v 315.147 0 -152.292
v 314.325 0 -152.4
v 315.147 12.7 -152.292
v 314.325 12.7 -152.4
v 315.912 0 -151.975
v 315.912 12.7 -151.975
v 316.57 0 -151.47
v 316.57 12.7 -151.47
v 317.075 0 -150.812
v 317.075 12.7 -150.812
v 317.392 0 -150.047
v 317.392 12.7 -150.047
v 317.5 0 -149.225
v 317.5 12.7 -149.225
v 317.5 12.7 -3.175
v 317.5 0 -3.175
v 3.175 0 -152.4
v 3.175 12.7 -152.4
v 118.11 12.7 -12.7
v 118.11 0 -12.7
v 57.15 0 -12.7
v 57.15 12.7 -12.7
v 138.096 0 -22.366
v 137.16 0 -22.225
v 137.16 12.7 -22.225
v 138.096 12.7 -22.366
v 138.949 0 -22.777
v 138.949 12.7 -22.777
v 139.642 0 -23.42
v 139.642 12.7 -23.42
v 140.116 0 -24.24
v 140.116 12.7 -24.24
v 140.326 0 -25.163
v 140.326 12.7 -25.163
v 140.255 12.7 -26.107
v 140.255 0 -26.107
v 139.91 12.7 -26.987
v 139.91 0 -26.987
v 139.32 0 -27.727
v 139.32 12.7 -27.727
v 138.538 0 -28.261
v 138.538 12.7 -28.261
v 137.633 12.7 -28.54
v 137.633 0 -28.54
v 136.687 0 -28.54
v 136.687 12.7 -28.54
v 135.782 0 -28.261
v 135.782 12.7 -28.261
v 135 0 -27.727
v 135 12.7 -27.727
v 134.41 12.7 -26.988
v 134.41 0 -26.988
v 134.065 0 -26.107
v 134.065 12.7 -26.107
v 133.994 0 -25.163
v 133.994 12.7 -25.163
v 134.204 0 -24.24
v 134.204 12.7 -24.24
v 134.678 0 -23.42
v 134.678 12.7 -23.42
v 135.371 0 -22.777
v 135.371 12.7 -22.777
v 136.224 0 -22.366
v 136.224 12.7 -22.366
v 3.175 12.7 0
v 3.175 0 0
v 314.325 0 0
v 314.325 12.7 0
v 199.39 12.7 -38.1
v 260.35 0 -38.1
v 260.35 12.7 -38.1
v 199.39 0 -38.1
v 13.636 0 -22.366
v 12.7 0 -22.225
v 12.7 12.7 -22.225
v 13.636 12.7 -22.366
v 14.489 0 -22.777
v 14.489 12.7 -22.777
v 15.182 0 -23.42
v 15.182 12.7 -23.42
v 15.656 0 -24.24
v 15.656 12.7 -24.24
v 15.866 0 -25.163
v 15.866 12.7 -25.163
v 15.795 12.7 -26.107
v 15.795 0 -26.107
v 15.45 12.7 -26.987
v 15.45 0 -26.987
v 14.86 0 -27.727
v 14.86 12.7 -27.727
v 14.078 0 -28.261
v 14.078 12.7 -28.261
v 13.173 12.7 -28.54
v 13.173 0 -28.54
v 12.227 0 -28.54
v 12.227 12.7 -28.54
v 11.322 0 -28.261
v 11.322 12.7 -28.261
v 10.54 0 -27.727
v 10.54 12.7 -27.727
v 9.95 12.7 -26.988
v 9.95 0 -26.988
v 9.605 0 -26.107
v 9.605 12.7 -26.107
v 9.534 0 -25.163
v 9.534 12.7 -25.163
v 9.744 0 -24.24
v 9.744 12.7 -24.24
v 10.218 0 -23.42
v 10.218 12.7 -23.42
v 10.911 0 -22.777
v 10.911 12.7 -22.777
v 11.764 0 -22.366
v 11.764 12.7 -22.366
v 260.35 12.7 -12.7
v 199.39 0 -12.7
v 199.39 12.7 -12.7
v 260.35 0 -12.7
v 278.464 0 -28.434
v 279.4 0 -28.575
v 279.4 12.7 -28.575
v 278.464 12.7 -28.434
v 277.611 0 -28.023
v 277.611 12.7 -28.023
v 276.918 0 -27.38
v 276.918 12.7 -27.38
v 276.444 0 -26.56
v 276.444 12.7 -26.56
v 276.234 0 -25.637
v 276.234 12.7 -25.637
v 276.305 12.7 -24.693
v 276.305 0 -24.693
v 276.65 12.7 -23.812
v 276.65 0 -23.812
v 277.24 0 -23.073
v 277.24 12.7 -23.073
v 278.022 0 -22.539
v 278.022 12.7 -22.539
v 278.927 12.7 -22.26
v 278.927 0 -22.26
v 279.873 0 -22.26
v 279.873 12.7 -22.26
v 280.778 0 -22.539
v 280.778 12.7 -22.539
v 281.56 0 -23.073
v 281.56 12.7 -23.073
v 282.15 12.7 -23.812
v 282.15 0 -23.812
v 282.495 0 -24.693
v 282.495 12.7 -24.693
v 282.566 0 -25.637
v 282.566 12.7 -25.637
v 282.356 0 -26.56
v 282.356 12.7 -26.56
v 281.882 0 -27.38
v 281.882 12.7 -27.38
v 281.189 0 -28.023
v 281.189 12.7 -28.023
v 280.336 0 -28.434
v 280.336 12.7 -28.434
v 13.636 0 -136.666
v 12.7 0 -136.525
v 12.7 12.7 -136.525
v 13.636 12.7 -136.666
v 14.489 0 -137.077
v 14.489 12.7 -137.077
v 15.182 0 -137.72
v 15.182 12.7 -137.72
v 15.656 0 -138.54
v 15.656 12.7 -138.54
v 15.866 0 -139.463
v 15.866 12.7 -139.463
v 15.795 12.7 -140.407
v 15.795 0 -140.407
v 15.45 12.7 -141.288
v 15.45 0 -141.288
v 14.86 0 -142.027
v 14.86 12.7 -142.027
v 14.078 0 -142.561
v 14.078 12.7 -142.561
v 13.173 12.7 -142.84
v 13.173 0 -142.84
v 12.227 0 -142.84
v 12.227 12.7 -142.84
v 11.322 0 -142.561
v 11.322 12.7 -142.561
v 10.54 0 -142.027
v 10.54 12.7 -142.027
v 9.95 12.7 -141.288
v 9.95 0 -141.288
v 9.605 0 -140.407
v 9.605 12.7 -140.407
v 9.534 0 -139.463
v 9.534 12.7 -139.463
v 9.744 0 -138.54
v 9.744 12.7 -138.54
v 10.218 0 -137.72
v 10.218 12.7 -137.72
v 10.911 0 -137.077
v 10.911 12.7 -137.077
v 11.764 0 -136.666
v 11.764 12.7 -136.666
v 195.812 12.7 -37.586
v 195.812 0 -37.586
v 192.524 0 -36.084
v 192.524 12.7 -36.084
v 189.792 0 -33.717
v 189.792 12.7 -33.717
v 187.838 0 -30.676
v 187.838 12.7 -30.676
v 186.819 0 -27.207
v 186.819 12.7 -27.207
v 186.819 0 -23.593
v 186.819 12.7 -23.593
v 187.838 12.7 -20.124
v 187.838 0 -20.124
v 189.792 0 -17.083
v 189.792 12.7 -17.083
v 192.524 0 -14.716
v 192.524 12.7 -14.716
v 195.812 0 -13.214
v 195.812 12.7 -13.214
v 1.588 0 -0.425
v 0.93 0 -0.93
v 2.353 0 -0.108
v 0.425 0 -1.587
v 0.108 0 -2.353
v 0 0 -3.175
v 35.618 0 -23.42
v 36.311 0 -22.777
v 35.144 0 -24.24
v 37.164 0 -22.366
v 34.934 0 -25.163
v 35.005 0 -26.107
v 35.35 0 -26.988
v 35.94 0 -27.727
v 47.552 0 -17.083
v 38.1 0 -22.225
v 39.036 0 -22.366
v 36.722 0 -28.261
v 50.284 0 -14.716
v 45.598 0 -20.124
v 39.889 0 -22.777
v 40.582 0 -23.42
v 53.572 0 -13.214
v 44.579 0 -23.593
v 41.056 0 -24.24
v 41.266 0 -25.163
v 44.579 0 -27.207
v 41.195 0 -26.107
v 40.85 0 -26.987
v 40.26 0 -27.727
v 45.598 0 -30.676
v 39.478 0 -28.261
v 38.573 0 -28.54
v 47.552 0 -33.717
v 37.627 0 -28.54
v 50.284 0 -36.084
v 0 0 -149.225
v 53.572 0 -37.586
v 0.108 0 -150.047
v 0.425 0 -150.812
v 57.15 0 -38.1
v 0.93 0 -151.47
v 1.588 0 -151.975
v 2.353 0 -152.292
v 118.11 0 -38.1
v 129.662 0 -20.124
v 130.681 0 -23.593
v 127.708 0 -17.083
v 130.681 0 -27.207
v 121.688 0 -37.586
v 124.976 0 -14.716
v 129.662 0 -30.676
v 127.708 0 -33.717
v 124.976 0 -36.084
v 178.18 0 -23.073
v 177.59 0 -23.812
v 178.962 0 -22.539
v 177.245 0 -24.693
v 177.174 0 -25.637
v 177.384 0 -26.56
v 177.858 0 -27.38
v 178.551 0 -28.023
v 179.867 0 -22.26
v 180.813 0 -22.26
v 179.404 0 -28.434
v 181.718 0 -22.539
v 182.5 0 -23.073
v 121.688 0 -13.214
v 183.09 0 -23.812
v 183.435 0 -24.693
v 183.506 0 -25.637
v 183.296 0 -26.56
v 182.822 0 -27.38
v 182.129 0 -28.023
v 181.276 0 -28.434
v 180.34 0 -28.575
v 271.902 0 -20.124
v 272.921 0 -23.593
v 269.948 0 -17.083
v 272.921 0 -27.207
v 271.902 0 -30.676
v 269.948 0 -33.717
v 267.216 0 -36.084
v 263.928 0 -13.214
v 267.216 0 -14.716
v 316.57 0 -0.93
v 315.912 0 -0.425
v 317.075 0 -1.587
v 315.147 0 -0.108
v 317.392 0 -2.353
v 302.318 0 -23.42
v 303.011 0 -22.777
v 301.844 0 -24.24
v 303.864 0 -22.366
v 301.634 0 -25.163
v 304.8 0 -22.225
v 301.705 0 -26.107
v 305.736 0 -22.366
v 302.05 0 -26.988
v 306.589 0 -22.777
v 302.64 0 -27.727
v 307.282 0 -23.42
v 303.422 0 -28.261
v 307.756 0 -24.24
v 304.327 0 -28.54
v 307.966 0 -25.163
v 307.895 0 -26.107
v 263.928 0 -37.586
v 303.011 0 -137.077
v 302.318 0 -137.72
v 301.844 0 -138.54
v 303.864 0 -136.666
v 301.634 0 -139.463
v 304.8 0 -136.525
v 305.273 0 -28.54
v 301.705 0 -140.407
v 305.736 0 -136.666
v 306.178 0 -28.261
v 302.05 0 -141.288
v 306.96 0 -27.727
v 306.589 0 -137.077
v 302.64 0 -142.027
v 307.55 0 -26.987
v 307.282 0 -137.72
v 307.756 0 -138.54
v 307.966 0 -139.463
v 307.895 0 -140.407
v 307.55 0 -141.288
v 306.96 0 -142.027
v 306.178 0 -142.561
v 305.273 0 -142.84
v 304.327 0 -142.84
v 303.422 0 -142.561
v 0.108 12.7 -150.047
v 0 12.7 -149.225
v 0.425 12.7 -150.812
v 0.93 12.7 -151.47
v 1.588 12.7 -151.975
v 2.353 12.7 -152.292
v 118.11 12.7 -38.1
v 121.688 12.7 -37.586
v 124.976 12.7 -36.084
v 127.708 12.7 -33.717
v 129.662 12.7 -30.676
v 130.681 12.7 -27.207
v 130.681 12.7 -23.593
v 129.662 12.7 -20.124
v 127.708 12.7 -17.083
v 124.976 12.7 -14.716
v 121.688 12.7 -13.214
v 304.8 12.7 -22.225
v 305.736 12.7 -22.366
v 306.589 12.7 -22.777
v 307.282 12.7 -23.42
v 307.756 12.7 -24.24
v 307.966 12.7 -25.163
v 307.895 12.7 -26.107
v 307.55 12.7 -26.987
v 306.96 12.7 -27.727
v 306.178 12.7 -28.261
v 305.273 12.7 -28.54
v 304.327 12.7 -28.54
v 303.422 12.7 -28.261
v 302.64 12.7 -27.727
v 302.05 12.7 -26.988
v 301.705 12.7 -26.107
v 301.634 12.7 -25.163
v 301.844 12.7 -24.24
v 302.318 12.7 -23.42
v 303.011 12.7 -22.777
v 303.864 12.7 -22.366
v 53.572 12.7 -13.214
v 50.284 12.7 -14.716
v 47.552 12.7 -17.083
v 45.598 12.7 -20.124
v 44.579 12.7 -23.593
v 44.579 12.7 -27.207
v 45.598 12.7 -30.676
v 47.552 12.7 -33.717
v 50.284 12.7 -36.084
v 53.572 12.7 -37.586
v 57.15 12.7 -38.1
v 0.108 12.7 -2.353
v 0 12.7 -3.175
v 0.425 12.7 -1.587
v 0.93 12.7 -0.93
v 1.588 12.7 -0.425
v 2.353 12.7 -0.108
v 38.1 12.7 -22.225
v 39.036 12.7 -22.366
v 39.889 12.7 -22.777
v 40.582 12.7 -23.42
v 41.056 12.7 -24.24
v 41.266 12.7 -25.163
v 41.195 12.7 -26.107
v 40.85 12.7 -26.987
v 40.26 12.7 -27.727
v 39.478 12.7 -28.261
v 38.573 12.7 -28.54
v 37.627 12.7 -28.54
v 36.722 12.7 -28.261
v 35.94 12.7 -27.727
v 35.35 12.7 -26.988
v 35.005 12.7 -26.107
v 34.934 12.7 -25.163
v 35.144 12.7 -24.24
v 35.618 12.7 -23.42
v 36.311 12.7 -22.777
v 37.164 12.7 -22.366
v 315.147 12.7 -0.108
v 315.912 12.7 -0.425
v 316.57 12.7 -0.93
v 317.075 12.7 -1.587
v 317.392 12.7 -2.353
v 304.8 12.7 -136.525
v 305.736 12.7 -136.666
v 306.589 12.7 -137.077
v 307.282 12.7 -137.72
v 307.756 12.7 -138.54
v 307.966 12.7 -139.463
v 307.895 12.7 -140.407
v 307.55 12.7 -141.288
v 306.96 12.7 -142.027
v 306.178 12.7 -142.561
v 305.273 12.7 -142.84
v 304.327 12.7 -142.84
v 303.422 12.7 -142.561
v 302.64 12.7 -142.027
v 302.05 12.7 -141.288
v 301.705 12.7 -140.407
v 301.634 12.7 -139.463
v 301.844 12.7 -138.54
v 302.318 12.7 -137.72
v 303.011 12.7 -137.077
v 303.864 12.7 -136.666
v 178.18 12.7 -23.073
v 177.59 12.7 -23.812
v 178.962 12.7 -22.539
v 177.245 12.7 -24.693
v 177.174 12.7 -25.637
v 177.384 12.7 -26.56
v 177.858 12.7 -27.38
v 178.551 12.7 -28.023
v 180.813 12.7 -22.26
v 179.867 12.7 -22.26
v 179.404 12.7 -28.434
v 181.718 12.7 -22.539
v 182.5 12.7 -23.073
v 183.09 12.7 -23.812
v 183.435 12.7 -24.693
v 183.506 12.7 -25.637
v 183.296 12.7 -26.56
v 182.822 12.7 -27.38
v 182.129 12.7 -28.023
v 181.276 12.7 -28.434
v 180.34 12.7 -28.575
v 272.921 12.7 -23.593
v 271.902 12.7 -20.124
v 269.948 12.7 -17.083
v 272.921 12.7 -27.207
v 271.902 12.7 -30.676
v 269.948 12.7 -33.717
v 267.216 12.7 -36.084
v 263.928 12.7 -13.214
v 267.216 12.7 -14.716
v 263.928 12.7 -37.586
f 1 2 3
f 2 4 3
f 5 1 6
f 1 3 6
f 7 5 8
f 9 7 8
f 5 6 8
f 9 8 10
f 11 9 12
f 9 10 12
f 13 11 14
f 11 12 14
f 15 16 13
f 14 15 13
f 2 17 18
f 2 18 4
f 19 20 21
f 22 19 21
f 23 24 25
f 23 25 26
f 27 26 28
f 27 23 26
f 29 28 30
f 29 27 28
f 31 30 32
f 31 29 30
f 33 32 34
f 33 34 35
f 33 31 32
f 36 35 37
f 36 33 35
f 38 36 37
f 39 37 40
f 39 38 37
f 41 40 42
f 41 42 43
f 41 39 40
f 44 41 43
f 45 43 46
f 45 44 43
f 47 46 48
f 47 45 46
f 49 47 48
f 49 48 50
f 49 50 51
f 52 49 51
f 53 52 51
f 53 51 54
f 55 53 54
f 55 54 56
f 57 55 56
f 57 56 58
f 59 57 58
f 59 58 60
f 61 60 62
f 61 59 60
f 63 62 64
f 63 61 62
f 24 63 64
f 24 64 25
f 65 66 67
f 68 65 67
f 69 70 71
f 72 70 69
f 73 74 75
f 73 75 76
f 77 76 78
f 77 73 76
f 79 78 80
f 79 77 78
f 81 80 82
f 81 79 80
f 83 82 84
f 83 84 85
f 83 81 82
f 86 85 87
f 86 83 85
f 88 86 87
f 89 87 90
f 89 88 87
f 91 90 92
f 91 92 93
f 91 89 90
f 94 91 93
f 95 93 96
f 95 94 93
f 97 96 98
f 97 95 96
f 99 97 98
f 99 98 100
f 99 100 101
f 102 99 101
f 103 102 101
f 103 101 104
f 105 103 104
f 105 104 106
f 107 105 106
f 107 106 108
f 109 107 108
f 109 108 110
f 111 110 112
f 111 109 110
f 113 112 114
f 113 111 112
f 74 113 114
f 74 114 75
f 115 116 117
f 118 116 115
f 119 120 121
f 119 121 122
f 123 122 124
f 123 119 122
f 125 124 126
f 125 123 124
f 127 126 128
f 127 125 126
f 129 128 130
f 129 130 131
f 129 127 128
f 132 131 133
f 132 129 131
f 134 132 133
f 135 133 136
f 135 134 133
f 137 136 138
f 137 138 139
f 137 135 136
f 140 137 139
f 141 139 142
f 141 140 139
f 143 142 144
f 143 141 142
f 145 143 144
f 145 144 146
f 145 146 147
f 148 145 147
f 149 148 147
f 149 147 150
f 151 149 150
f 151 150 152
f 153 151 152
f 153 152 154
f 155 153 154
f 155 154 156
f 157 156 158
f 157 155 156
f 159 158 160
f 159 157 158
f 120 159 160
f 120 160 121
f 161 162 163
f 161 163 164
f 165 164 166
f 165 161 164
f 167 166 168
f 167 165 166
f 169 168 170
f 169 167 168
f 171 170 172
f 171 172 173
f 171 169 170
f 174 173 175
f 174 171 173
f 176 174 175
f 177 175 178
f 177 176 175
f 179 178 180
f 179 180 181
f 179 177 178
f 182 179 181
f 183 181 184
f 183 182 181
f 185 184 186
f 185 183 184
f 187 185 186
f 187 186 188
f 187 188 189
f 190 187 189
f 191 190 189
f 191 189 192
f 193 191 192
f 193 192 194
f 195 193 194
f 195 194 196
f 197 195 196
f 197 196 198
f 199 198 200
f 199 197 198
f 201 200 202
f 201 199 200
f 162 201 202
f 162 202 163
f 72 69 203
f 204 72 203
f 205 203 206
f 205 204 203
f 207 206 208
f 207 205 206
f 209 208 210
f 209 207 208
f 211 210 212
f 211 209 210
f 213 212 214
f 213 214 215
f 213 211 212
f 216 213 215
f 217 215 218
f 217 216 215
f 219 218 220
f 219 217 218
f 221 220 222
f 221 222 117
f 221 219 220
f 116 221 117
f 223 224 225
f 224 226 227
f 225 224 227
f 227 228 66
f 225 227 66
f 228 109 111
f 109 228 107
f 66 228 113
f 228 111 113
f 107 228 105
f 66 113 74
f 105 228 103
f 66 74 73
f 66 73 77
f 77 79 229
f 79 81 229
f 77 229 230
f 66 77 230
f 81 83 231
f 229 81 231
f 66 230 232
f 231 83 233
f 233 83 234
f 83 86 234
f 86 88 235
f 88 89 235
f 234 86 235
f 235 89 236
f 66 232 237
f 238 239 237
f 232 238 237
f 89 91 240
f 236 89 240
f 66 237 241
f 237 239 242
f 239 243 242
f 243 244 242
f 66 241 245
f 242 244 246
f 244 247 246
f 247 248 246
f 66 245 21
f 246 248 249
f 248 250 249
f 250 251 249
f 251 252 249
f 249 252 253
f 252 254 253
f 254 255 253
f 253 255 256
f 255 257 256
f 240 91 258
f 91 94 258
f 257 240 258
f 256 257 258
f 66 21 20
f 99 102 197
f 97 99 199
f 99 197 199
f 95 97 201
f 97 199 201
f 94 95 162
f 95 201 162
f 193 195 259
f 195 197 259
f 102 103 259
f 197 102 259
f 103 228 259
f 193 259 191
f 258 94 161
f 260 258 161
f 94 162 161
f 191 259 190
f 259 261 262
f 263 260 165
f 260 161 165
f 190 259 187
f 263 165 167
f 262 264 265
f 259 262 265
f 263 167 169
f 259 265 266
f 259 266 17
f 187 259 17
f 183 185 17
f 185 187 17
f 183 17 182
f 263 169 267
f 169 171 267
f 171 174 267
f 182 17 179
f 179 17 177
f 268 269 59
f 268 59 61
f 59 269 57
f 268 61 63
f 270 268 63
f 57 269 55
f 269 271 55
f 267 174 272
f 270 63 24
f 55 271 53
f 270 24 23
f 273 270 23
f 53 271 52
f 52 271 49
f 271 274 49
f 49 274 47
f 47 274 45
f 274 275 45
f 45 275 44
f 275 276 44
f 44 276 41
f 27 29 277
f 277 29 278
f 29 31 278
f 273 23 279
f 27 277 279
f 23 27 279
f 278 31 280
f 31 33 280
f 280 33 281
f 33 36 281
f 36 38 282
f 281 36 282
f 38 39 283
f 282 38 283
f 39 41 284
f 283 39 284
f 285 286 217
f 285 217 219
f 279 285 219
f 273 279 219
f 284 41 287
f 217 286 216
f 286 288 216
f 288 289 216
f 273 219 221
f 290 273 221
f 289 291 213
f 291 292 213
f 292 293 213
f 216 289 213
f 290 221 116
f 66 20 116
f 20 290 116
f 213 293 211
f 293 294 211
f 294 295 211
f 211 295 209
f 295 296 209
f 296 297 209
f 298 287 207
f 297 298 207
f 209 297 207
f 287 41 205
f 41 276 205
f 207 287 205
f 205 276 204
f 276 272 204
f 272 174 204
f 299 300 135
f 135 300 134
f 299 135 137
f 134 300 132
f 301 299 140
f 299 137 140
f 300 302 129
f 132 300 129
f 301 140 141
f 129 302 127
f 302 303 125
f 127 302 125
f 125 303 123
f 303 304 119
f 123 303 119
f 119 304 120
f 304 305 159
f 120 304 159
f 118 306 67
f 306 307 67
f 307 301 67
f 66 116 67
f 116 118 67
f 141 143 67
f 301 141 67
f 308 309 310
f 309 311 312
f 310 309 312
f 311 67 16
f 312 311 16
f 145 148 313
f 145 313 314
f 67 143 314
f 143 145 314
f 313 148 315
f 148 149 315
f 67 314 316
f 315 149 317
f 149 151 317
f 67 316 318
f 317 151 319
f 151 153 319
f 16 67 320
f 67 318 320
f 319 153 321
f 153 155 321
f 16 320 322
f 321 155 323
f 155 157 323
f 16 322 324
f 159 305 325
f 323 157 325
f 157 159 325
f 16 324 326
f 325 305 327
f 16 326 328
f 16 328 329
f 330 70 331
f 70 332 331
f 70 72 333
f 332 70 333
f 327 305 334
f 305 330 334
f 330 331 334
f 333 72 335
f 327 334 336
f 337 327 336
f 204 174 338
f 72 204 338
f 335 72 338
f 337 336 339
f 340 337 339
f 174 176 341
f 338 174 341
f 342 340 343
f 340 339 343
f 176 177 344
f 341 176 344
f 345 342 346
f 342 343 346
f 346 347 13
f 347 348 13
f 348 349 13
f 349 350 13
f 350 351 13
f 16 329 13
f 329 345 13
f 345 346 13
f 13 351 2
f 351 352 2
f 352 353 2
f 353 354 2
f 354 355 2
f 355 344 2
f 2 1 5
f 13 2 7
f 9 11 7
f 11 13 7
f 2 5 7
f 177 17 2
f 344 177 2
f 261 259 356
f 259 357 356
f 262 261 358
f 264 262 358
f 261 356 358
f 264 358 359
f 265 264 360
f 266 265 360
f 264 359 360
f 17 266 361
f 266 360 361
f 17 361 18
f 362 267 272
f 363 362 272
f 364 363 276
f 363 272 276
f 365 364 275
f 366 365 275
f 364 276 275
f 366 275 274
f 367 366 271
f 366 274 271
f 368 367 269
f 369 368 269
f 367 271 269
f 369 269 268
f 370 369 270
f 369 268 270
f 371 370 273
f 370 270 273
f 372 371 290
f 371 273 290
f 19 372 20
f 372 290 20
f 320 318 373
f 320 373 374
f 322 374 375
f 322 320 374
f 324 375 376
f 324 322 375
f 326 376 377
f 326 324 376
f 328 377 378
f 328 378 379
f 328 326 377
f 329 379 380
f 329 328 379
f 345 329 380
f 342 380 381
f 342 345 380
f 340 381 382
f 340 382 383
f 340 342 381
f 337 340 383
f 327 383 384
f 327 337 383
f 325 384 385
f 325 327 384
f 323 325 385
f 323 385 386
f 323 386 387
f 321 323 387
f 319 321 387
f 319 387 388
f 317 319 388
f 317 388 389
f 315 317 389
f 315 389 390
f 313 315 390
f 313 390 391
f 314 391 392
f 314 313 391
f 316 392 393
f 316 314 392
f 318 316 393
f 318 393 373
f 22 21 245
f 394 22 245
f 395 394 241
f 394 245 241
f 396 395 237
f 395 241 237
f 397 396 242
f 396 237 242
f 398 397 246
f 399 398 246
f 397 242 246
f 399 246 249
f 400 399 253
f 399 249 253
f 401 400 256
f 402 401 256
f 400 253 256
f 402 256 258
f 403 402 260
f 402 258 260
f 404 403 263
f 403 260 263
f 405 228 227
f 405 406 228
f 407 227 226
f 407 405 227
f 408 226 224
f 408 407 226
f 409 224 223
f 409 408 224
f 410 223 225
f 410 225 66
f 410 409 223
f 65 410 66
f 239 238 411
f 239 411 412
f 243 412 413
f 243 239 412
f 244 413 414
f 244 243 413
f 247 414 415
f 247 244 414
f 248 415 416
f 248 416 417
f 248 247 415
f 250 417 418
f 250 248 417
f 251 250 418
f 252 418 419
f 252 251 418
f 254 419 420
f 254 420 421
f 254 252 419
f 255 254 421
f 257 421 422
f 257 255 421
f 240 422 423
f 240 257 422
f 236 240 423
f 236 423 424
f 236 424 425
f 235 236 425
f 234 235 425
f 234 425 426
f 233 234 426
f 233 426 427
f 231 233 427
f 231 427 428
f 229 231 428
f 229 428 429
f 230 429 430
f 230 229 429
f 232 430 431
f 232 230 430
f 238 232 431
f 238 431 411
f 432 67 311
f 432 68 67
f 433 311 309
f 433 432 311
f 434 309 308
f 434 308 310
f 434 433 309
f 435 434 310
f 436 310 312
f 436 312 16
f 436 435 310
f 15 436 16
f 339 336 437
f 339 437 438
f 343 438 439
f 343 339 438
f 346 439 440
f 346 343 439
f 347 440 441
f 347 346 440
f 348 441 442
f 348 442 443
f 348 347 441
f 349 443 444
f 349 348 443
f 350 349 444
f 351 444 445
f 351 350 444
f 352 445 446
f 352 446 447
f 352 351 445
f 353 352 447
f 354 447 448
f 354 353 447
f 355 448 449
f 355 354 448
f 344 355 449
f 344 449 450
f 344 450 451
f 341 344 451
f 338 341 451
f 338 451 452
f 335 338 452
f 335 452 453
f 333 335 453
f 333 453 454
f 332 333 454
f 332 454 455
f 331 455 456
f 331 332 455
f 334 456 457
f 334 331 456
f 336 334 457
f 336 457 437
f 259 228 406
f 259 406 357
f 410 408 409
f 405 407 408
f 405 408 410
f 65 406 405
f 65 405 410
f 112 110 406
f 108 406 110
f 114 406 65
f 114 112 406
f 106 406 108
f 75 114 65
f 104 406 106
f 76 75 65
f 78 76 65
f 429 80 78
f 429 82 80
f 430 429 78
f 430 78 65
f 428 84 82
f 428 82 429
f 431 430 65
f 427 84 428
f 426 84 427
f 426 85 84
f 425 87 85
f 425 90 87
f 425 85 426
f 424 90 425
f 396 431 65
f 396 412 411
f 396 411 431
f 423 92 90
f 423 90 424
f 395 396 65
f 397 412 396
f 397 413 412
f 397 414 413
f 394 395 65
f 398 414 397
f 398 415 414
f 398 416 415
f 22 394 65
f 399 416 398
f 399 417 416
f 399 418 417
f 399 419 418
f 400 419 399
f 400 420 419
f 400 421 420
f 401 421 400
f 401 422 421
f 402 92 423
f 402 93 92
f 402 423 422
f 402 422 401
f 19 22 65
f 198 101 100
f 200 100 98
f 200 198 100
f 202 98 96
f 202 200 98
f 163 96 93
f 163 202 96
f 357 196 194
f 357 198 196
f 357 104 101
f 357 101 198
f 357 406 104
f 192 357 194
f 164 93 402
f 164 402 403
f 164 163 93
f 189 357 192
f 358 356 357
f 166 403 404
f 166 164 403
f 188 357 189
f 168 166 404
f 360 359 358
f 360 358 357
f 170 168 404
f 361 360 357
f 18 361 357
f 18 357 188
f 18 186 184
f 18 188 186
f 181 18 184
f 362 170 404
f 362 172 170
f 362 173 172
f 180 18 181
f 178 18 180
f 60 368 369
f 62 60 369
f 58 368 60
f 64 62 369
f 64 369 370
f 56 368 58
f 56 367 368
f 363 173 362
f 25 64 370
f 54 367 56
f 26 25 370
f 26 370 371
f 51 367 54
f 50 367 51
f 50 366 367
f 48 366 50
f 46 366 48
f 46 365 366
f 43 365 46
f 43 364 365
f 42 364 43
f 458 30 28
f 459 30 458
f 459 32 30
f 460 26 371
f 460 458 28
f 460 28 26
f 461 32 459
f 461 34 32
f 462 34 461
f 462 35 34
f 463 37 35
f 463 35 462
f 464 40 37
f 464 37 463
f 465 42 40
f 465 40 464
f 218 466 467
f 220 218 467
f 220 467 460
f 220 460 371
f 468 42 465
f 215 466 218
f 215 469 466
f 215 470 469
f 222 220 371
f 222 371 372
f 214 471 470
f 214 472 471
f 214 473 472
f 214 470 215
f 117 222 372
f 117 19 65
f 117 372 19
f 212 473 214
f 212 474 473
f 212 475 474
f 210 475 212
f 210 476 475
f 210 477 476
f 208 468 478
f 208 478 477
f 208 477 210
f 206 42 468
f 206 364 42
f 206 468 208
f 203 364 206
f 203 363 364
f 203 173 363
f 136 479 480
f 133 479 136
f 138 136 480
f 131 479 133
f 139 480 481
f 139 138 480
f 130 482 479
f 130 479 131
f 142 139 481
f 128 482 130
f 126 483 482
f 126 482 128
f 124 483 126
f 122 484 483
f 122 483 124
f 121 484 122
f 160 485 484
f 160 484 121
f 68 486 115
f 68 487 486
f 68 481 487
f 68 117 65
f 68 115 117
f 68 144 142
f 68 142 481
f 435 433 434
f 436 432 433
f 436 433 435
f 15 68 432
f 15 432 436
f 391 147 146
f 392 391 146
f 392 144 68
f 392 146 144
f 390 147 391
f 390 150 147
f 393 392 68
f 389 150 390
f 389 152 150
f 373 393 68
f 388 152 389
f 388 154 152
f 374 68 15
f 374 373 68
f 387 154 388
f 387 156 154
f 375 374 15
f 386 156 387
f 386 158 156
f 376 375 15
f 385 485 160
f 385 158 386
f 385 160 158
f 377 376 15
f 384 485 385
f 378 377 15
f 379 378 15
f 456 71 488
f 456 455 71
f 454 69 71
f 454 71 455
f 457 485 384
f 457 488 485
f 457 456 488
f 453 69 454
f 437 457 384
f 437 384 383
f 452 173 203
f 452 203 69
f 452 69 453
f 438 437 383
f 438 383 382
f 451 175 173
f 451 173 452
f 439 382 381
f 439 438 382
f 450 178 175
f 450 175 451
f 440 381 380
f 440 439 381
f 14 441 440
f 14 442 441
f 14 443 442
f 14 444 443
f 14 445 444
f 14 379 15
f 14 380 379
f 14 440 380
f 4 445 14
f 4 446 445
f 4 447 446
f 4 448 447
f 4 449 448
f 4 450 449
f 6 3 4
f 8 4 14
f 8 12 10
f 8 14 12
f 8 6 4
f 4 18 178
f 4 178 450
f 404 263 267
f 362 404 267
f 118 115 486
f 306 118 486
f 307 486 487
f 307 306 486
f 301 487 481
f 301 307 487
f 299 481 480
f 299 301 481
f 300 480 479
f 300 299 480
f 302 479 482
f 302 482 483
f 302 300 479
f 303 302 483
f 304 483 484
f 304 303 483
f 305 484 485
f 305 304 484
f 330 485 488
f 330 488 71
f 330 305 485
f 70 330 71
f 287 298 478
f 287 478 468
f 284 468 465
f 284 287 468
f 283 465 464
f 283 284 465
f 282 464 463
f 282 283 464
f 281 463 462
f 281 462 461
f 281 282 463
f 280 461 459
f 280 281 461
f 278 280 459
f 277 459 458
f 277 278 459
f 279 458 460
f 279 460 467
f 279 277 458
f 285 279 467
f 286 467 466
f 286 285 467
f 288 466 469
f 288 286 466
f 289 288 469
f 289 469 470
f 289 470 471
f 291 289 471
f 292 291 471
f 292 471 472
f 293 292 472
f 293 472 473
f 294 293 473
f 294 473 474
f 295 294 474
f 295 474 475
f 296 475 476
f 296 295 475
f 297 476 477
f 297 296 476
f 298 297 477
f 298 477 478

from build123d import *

# Parameters (mm, degrees)
SKETCH1_W           = 317.5
SKETCH1_H           = 152.4
SKETCH1_R           = 3.175
BOSS_EXTRUDE1_DEPTH = 12.7
FILLET1_R           = 3.175


with BuildPart() as part:
    # Sketch1 → Boss-Extrude1 (new body)
    with BuildSketch(Plane(origin=(0, 0, 0), x_dir=(1, 0, 0), z_dir=(0, 1, 0))):
        with Locations((158.75, 76.2)):
            Rectangle(SKETCH1_W, SKETCH1_H)
        with Locations(Location((12.7, 25.4, 0), (0, 0, 270))):
            Circle(SKETCH1_R, mode=Mode.SUBTRACT)
        with Locations(Location((12.7, 139.7, 0), (0, 0, 270))):
            Circle(SKETCH1_R, mode=Mode.SUBTRACT)
        with Locations(Location((304.8, 139.7, 0), (0, 0, 270))):
            Circle(SKETCH1_R, mode=Mode.SUBTRACT)
        with Locations(Location((304.8, 25.4, 0), (0, 0, 270))):
            Circle(SKETCH1_R, mode=Mode.SUBTRACT)
        with Locations(Location((38.1, 25.4, 0), (0, 0, 270))):
            Circle(SKETCH1_R, mode=Mode.SUBTRACT)
        with Locations(Location((137.16, 25.4, 0), (0, 0, 270))):
            Circle(SKETCH1_R, mode=Mode.SUBTRACT)
        with Locations(Location((180.34, 25.4, 0), (0, 0, 90))):
            Circle(SKETCH1_R, mode=Mode.SUBTRACT)
        with Locations(Location((279.4, 25.4, 0), (0, 0, 90))):
            Circle(SKETCH1_R, mode=Mode.SUBTRACT)
        with BuildLine():
            Line((57.15, 38.1), (118.11, 38.1))
            ThreePointArc((118.11, 38.1), (130.81, 25.4), (118.11, 12.7))
            Line((118.11, 12.7), (57.15, 12.7))
            ThreePointArc((57.15, 12.7), (44.45, 25.4), (57.15, 38.1))
        make_face(mode=Mode.SUBTRACT)
        with BuildLine():
            Line((260.35, 38.1), (199.39, 38.1))
            ThreePointArc((199.39, 38.1), (186.69, 25.4), (199.39, 12.7))
            Line((199.39, 12.7), (260.35, 12.7))
            ThreePointArc((260.35, 12.7), (273.05, 25.4), (260.35, 38.1))
        make_face(mode=Mode.SUBTRACT)
    extrude(amount=BOSS_EXTRUDE1_DEPTH)

    # Fillet1
    fillet1_edges = [part.edges().sort_by_distance(p)[0] for p in [
        (0, 6.35, -152.4),
        (317.5, 6.35, -152.4),
        (317.5, 6.35, 0),
        (0, 6.35, 0),
    ]]
    fillet(fillet1_edges, radius=FILLET1_R)


solid = part.part
